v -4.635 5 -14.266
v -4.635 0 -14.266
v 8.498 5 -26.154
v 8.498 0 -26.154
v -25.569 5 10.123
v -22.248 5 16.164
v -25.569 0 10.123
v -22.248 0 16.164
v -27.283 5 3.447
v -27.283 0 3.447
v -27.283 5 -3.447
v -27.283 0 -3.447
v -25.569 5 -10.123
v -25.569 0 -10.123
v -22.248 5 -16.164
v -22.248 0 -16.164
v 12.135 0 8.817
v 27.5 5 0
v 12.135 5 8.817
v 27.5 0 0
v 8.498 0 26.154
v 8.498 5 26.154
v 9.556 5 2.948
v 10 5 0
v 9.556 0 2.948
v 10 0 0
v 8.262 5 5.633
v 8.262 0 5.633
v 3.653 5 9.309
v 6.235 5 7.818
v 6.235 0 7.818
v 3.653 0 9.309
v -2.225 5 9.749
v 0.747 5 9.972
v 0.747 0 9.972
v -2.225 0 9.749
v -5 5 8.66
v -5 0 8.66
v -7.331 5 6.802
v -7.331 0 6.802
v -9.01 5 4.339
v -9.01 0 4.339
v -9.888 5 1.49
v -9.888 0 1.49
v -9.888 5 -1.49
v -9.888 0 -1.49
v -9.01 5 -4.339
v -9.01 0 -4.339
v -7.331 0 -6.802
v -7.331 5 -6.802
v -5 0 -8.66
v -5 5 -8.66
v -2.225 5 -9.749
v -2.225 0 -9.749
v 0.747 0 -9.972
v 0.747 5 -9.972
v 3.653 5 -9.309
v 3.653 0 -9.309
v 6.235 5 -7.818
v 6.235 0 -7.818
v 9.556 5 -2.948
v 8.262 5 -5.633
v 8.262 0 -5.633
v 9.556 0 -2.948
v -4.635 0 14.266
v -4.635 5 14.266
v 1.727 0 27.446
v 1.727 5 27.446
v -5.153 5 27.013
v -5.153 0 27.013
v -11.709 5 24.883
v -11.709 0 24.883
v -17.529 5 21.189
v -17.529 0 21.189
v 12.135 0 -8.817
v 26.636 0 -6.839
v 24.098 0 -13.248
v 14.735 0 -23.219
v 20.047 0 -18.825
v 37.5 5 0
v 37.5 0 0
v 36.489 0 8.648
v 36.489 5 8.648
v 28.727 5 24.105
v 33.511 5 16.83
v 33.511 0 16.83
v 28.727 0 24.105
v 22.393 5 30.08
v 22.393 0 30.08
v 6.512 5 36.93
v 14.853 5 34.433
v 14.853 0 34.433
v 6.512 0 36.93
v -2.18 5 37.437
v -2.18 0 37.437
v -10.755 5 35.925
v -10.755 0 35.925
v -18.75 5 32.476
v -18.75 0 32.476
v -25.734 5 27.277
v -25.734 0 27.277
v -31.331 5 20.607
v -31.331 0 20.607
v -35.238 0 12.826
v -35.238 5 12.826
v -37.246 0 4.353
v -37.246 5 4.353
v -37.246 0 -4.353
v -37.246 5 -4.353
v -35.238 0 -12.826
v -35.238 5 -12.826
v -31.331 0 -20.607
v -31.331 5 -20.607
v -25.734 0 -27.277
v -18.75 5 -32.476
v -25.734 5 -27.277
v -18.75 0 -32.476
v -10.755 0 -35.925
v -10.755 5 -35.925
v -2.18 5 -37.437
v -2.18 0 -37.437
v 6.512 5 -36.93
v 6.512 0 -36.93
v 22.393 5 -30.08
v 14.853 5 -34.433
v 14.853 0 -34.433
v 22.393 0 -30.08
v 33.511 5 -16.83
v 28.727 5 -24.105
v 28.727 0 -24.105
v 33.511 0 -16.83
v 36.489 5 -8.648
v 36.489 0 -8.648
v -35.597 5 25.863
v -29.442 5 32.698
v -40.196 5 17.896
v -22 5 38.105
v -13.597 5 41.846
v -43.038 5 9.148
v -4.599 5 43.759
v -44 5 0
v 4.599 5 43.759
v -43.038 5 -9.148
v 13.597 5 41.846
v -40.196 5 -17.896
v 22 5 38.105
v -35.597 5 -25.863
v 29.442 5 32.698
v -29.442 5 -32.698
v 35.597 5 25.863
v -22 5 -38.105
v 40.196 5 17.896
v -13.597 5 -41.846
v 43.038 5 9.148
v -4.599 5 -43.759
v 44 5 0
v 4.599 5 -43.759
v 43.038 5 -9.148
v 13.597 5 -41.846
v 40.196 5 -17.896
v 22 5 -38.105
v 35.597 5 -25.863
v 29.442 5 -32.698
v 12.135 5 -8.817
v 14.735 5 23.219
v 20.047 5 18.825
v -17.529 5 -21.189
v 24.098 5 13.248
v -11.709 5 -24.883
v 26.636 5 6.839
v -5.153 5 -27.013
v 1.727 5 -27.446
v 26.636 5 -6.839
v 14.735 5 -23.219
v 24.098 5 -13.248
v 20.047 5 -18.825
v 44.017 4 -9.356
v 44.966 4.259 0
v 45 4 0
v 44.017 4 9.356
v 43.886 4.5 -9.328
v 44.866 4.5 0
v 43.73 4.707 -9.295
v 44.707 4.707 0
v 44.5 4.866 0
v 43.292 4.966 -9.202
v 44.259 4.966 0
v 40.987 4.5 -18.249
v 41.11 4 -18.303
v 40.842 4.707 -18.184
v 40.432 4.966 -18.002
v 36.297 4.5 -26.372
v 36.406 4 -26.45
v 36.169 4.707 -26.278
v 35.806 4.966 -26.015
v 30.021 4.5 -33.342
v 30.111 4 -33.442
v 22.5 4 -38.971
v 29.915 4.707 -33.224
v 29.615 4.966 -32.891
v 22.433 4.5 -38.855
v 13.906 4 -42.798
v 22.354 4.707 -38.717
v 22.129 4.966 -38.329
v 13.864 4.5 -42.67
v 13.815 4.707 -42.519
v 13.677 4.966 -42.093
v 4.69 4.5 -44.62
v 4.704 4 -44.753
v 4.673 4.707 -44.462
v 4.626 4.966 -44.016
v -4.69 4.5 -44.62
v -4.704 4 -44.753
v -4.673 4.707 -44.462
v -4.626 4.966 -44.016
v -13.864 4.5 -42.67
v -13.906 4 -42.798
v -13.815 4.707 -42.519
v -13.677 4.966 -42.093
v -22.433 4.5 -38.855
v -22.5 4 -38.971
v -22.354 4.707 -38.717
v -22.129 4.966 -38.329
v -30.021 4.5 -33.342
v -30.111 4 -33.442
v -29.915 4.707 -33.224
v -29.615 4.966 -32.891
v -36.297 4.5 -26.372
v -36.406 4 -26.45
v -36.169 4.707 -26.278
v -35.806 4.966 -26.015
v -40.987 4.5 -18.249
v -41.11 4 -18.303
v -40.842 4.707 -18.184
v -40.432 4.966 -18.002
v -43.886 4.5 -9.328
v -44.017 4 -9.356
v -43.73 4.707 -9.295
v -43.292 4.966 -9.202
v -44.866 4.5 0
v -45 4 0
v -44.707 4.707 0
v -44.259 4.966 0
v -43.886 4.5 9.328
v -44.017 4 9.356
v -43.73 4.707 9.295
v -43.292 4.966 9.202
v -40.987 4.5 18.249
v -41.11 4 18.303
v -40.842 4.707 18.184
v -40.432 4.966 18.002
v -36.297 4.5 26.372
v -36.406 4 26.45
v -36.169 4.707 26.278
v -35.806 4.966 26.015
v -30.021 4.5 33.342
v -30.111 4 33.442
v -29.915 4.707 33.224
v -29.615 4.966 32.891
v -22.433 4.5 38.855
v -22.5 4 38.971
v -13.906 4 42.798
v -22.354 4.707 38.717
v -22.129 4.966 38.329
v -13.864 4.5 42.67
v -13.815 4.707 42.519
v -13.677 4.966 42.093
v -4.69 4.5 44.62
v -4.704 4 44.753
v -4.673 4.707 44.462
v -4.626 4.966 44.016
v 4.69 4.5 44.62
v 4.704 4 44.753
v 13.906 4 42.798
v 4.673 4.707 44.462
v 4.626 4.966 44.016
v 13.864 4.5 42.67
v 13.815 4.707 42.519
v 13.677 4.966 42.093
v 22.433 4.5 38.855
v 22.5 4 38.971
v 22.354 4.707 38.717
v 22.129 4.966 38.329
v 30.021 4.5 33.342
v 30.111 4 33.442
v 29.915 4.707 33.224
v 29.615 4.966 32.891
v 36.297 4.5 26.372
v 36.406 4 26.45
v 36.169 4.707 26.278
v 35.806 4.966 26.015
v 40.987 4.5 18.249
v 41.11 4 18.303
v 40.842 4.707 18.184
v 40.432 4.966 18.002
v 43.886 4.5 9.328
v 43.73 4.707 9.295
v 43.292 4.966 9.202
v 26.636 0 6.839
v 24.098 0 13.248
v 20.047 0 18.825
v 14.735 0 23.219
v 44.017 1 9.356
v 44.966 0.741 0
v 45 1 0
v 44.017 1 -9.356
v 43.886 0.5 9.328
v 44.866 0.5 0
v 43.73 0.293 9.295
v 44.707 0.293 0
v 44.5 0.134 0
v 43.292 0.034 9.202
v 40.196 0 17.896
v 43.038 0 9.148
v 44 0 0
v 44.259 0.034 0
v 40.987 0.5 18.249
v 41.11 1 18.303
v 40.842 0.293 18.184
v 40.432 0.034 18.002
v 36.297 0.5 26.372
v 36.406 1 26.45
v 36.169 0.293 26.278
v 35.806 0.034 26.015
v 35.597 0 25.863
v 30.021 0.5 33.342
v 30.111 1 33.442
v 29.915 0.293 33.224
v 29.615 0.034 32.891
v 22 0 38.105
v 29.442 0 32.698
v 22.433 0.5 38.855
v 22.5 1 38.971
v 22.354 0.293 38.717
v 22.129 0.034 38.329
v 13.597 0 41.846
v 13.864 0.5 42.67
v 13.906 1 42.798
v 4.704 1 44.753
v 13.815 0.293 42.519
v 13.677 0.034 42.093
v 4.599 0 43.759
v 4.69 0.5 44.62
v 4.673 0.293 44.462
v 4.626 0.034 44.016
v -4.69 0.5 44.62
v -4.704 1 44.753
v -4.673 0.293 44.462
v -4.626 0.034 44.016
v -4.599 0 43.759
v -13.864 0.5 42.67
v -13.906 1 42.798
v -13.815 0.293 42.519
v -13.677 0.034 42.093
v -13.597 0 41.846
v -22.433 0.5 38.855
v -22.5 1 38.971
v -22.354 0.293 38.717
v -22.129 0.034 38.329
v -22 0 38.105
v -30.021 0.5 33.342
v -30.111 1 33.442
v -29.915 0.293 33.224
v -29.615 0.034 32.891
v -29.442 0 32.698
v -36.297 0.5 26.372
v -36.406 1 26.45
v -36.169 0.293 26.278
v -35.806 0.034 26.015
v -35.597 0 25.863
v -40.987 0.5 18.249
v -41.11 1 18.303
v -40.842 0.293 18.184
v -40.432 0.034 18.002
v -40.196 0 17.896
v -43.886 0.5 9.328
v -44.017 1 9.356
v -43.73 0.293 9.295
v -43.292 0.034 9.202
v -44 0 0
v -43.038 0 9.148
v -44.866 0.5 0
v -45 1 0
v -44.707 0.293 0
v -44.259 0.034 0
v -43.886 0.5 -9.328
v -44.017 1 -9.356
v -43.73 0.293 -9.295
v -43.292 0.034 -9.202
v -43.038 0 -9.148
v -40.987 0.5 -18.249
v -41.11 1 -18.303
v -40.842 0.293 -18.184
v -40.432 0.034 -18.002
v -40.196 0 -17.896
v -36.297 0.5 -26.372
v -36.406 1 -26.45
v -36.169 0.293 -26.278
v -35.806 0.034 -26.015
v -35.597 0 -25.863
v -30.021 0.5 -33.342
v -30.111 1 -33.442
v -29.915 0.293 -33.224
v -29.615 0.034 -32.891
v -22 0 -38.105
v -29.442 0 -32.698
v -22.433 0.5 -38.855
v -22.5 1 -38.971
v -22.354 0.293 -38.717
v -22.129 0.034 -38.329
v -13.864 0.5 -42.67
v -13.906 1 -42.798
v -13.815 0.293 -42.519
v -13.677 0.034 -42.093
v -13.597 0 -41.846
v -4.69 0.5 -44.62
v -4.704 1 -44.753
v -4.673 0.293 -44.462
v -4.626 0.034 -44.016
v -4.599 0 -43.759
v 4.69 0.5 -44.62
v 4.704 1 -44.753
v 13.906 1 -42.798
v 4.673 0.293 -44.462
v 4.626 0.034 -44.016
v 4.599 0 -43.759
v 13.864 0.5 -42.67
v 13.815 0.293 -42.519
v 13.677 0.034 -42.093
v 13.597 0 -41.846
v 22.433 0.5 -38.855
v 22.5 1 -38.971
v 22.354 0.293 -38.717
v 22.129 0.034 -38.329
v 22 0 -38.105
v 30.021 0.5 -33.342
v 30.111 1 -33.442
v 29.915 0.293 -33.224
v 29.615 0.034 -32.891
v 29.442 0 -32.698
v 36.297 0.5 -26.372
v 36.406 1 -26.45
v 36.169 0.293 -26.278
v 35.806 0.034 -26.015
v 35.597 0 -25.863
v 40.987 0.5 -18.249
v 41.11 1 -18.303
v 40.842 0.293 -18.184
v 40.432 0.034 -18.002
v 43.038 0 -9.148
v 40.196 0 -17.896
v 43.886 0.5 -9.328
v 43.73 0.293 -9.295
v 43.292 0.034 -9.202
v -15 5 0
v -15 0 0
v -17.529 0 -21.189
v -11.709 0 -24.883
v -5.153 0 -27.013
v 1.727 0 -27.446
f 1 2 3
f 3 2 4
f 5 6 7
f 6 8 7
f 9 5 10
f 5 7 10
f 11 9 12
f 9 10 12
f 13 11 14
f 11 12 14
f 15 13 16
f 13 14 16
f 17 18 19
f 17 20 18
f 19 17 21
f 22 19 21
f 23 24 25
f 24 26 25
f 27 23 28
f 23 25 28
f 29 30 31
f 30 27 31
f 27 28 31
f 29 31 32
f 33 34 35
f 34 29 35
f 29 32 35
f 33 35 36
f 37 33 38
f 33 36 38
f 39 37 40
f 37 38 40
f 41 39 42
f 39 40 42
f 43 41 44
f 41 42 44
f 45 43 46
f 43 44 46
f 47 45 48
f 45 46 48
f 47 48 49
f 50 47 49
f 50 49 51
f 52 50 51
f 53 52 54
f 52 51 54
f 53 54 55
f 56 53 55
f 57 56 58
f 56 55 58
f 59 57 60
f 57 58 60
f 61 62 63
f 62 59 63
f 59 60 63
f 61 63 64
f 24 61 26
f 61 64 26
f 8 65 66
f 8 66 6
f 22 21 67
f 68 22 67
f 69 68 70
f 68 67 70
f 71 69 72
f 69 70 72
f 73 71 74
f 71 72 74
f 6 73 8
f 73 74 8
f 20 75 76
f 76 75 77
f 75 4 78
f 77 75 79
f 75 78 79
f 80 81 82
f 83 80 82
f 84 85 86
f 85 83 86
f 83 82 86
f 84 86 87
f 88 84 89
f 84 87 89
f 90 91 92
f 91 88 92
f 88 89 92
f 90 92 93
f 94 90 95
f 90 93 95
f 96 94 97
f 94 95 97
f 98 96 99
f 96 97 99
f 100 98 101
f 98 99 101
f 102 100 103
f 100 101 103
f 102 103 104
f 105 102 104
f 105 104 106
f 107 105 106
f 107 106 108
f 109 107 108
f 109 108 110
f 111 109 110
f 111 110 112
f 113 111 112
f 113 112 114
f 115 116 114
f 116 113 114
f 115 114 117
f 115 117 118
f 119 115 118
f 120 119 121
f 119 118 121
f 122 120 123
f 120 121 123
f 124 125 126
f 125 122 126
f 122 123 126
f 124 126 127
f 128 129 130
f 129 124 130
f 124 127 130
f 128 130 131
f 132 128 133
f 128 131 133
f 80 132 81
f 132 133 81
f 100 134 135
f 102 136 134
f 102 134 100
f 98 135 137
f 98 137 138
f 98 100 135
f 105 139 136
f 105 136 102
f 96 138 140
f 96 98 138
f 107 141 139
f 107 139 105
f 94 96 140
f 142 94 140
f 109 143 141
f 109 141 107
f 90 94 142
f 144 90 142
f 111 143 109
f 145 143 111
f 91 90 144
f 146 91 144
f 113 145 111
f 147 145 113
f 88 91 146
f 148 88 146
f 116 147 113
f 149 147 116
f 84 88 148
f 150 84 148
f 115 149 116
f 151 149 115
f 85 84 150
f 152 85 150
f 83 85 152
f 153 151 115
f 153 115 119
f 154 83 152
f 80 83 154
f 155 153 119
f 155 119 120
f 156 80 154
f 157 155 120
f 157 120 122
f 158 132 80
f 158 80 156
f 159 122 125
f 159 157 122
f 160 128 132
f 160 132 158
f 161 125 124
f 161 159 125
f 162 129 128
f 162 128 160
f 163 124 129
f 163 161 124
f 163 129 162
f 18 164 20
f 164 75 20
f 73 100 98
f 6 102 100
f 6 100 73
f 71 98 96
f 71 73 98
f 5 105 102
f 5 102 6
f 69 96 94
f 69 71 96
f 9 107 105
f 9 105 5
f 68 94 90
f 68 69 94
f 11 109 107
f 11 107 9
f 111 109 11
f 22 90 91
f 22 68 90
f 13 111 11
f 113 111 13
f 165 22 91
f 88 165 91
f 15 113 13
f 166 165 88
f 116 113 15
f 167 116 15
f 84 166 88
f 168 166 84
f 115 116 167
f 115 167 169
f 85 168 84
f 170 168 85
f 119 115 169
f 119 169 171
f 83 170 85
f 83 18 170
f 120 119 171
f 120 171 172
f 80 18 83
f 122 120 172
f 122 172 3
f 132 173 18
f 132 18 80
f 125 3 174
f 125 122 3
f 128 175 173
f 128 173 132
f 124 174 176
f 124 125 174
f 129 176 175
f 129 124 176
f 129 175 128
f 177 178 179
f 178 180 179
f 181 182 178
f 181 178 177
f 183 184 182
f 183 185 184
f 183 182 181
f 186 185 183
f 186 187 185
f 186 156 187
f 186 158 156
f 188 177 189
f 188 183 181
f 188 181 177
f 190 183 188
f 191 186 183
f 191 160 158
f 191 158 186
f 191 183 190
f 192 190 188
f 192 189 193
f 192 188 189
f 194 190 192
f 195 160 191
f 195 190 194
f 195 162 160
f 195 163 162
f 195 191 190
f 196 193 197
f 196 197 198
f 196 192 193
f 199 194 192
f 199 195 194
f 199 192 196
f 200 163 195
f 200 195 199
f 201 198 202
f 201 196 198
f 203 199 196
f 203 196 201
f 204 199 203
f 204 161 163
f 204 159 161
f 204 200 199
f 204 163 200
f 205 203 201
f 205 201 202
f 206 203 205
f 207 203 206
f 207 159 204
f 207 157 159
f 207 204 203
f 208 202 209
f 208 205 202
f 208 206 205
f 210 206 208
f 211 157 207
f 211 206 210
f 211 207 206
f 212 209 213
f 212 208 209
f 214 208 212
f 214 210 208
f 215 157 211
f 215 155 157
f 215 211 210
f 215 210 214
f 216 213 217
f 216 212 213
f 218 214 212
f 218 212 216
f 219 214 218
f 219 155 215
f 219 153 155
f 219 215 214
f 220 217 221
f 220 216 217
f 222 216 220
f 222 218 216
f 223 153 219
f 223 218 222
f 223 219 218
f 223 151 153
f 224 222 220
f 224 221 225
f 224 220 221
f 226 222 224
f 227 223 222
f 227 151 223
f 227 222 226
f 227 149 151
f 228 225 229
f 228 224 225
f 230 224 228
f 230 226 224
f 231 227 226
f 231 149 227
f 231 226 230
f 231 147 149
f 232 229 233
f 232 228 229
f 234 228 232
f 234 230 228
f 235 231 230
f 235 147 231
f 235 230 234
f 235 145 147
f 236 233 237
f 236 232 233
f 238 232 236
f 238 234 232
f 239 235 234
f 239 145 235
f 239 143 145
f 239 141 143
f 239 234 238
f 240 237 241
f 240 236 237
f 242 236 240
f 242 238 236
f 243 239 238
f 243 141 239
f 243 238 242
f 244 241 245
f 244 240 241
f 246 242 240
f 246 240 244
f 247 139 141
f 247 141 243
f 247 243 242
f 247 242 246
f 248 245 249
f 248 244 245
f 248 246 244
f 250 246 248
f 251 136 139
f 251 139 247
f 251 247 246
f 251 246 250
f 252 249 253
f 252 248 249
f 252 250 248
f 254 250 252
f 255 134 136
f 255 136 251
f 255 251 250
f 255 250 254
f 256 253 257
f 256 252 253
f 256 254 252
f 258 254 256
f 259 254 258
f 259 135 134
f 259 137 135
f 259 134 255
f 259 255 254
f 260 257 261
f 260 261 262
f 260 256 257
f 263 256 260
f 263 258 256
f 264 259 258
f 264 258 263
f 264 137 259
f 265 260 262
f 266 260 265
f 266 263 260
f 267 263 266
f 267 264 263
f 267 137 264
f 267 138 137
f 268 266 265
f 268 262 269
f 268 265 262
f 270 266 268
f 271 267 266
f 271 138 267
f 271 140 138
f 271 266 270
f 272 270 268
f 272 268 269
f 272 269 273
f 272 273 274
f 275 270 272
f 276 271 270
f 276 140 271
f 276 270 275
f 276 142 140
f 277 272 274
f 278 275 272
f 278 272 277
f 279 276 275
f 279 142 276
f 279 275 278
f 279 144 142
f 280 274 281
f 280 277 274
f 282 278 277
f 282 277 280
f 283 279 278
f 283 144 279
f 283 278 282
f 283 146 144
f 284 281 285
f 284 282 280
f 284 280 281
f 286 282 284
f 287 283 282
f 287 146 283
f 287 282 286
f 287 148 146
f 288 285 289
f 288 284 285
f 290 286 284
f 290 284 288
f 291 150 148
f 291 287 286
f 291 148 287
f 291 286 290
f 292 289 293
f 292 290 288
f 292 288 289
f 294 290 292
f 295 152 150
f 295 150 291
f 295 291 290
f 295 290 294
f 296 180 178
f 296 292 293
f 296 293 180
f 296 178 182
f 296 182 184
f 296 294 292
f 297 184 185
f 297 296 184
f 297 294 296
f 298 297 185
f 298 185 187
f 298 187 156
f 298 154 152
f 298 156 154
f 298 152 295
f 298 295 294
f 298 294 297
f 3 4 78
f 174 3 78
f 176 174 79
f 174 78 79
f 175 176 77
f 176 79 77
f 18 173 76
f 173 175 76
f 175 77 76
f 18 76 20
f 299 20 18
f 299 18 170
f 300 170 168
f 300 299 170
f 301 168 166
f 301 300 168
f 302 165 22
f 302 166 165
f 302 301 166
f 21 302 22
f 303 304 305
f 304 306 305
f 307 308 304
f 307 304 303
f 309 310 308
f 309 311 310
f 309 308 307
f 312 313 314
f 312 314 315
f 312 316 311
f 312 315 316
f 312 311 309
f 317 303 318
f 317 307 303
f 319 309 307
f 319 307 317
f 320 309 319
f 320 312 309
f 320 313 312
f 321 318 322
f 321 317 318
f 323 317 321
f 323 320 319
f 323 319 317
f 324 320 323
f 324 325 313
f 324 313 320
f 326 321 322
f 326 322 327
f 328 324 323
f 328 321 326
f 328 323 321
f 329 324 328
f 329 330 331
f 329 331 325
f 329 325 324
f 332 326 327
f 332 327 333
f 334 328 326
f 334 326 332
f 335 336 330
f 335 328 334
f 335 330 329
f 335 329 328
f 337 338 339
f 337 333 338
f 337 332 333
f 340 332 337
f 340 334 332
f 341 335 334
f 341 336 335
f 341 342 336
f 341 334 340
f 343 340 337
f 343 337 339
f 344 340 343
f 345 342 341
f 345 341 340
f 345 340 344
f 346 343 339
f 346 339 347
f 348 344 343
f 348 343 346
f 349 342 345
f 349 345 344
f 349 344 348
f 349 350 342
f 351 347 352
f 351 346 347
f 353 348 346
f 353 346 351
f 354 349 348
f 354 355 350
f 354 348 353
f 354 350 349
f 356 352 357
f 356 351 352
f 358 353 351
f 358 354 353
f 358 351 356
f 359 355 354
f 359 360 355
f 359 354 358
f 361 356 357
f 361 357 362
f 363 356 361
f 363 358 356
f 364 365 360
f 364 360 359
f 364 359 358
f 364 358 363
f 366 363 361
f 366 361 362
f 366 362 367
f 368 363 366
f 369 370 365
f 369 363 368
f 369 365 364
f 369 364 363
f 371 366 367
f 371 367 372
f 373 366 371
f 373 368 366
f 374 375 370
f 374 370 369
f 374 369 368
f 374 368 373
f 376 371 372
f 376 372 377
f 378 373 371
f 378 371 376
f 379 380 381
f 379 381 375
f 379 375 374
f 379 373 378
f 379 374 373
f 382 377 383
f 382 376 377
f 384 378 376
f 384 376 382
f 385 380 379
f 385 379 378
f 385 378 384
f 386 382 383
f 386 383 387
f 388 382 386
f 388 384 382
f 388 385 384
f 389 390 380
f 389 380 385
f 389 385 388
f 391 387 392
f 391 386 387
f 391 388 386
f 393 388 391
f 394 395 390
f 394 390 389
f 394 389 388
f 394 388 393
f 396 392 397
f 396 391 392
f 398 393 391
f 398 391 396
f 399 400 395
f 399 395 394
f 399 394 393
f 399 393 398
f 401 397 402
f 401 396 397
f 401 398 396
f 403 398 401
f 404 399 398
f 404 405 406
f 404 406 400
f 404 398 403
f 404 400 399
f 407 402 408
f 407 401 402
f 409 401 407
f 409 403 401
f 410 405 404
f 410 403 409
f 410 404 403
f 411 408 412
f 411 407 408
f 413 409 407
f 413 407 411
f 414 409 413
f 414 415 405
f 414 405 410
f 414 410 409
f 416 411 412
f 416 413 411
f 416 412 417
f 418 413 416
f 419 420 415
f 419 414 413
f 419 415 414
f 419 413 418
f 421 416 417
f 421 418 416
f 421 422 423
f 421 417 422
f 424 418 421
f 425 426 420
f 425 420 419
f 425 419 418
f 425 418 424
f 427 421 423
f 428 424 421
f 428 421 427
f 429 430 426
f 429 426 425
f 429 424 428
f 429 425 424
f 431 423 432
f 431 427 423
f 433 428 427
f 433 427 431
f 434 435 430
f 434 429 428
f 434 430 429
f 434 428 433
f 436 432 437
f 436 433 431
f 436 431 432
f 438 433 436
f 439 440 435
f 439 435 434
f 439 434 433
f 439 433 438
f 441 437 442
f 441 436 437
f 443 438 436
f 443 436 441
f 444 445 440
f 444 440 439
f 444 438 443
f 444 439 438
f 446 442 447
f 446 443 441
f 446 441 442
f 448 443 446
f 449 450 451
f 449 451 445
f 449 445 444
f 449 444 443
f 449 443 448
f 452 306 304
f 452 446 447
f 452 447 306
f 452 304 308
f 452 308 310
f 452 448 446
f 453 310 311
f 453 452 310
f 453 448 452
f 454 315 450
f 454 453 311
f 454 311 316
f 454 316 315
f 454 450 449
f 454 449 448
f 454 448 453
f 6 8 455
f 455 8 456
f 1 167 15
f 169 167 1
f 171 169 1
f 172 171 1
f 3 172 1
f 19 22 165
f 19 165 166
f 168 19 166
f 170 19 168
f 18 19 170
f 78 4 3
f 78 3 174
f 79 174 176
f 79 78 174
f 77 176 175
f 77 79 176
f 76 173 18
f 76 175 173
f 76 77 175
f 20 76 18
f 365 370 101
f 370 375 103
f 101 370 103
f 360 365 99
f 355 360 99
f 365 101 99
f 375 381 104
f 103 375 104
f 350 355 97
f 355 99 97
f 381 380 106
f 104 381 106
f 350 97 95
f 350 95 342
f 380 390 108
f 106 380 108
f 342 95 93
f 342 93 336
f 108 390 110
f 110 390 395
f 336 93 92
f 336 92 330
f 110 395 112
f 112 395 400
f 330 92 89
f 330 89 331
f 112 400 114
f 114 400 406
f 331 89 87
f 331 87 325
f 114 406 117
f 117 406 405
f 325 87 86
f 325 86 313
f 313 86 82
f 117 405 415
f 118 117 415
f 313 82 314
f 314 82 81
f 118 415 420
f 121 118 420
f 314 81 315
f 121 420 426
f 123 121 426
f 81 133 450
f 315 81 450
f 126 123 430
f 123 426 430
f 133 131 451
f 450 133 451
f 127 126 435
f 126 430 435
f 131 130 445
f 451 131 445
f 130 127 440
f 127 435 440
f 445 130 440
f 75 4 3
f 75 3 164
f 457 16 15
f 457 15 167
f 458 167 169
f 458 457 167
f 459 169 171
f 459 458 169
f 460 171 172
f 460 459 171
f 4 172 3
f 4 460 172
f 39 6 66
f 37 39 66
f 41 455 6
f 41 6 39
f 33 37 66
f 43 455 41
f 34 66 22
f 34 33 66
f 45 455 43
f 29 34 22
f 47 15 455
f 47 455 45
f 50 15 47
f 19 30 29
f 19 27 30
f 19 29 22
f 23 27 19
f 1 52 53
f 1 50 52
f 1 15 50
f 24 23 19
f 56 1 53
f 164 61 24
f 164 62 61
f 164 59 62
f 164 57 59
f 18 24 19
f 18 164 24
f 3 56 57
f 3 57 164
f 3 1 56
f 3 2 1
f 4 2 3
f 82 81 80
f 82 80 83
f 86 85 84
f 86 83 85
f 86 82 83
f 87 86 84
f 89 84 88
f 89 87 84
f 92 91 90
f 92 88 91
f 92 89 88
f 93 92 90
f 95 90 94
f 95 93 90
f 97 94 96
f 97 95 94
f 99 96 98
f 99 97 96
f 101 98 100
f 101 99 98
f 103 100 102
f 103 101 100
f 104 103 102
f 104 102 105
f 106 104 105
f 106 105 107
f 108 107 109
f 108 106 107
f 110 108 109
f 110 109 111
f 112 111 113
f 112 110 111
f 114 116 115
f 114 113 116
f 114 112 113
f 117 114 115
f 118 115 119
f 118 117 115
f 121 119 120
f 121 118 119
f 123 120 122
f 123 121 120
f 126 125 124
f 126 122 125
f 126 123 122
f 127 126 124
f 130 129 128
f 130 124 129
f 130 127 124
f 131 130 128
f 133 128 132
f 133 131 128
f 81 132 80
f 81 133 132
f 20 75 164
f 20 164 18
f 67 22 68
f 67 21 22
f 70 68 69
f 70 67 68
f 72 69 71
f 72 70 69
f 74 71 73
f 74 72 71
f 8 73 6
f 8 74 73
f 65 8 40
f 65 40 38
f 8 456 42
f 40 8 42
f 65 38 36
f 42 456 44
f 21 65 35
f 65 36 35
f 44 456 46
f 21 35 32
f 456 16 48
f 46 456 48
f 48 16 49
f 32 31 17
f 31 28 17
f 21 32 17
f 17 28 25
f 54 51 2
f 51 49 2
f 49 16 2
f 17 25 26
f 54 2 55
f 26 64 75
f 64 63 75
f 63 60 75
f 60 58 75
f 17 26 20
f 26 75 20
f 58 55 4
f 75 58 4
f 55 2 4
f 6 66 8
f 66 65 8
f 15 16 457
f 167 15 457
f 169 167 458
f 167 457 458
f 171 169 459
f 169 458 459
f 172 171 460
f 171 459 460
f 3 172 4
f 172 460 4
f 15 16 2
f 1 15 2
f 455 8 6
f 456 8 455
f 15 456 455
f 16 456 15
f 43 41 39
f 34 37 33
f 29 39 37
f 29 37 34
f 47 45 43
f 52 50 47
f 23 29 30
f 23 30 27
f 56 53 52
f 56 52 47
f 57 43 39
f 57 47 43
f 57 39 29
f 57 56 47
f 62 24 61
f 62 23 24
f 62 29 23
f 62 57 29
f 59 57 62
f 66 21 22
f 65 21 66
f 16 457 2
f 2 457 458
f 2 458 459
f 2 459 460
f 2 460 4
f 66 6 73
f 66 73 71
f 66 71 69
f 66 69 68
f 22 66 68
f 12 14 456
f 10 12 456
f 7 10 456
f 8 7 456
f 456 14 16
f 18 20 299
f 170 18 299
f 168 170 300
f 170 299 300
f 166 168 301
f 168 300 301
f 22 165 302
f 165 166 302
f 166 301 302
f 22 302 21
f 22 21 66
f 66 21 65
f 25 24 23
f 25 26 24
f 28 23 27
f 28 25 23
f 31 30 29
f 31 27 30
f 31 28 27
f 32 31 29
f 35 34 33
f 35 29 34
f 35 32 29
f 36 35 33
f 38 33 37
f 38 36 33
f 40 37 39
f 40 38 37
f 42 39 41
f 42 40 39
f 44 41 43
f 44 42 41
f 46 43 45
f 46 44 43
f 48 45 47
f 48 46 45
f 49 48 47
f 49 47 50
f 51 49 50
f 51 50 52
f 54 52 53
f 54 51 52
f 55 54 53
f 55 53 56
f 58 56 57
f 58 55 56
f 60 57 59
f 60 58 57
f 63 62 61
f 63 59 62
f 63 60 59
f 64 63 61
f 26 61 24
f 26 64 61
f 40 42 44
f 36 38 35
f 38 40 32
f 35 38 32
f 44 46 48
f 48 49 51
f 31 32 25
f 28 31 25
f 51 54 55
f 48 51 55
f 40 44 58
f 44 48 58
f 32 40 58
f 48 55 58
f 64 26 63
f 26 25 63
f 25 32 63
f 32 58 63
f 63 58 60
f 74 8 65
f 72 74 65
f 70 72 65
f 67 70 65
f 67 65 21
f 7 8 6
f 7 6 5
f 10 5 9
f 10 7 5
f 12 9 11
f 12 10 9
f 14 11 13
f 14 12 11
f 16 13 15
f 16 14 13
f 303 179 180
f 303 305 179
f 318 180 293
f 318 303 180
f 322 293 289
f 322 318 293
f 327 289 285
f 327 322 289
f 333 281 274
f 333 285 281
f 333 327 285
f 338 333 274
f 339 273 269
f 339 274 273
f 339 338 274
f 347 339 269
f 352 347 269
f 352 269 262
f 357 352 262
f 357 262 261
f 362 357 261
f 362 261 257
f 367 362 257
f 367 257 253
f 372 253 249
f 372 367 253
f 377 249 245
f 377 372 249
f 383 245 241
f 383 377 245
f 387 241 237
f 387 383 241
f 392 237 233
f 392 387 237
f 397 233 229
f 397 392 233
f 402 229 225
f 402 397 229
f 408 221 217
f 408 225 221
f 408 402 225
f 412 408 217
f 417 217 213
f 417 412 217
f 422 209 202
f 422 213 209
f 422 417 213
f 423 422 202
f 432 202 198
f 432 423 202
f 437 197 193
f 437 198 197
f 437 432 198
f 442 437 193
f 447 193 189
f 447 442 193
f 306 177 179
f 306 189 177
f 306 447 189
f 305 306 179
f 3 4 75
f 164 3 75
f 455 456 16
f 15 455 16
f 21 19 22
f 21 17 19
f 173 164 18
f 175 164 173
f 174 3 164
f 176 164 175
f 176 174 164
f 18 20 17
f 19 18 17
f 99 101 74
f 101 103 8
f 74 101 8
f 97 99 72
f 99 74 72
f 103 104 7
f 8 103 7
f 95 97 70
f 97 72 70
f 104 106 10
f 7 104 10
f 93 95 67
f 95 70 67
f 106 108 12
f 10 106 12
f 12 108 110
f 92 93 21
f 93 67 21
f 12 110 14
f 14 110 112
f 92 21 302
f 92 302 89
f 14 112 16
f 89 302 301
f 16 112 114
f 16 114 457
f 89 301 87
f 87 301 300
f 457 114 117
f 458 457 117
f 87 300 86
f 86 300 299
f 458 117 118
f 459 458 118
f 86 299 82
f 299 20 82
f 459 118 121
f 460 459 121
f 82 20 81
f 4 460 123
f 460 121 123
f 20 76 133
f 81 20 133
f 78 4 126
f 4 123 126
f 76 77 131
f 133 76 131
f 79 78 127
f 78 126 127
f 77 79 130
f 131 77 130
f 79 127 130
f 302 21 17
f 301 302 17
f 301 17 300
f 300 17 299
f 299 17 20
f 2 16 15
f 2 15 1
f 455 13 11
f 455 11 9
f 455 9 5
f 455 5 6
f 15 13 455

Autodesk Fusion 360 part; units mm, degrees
sketch "Sketch1" plane through (0, 0, 0) normal (0, 1, 0) x (1, 0, 0)
  circle A0 centre (0, 0) radius 45
  circle A1 centre (0, 0) radius 37.5
  circle A2 centre (0, 0) radius 27.5
  line L0 (0, 0) -> (27.5, 0) construction
  line L1 (0, 0) -> (27.5, 0) construction
  line L2 (-22.248, -16.1641) -> (-15, 0)
  line L3 (-15, 0) -> (-22.248, 16.1641)
  line L4 (8.498, -26.1541) -> (-4.6353, -14.2658)
  line L5 (-4.6353, -14.2658) -> (-22.248, -16.1641)
  line L6 (27.5, 0) -> (12.1353, -8.8168)
  line L7 (12.1353, -8.8168) -> (8.498, -26.1541)
  line L8 (8.498, 26.1541) -> (12.1353, 8.8168)
  line L9 (12.1353, 8.8168) -> (27.5, 0)
  line L10 (-22.248, 16.1641) -> (-4.6353, 14.2658)
  line L11 (-4.6353, 14.2658) -> (8.498, 26.1541)
  circle A3 centre (0, 0) radius 10
  dimension "d2" = 90
  dimension "d3" = 75
  dimension "d12" = 360
  dimension "d13" = 20
extrude "Extrude1" add sketch "Sketch1" along normal blind 5 contours L2 L3 L4 L5 L6 L7 L8 L9 L10 L11 makes body 1
extrude "Extrude2" add sketch "Sketch1" along normal blind 5 separate body contours A3 makes body 2
extrude "Extrude3" add sketch "Sketch1" along normal blind 5 separate body contours A2 L8 L9 | A2 L6 L7 | A2 L10 L11 | A2 L4 L5 | A2 L2 L3 makes body 3 at (18.8409, 0, -13.6887)
extrude "Extrude4" add sketch "Sketch1" along normal blind 5 separate body contours A1 makes body 4
extrude "Extrude5" add sketch "Sketch1" along normal blind 5 separate body contours A0 makes body 5
fillet "Fillet1" radius 1 2 edges at (-41.9547, 5, 16.2727) (-41.9547, 0, 16.2727) on bodies 5
